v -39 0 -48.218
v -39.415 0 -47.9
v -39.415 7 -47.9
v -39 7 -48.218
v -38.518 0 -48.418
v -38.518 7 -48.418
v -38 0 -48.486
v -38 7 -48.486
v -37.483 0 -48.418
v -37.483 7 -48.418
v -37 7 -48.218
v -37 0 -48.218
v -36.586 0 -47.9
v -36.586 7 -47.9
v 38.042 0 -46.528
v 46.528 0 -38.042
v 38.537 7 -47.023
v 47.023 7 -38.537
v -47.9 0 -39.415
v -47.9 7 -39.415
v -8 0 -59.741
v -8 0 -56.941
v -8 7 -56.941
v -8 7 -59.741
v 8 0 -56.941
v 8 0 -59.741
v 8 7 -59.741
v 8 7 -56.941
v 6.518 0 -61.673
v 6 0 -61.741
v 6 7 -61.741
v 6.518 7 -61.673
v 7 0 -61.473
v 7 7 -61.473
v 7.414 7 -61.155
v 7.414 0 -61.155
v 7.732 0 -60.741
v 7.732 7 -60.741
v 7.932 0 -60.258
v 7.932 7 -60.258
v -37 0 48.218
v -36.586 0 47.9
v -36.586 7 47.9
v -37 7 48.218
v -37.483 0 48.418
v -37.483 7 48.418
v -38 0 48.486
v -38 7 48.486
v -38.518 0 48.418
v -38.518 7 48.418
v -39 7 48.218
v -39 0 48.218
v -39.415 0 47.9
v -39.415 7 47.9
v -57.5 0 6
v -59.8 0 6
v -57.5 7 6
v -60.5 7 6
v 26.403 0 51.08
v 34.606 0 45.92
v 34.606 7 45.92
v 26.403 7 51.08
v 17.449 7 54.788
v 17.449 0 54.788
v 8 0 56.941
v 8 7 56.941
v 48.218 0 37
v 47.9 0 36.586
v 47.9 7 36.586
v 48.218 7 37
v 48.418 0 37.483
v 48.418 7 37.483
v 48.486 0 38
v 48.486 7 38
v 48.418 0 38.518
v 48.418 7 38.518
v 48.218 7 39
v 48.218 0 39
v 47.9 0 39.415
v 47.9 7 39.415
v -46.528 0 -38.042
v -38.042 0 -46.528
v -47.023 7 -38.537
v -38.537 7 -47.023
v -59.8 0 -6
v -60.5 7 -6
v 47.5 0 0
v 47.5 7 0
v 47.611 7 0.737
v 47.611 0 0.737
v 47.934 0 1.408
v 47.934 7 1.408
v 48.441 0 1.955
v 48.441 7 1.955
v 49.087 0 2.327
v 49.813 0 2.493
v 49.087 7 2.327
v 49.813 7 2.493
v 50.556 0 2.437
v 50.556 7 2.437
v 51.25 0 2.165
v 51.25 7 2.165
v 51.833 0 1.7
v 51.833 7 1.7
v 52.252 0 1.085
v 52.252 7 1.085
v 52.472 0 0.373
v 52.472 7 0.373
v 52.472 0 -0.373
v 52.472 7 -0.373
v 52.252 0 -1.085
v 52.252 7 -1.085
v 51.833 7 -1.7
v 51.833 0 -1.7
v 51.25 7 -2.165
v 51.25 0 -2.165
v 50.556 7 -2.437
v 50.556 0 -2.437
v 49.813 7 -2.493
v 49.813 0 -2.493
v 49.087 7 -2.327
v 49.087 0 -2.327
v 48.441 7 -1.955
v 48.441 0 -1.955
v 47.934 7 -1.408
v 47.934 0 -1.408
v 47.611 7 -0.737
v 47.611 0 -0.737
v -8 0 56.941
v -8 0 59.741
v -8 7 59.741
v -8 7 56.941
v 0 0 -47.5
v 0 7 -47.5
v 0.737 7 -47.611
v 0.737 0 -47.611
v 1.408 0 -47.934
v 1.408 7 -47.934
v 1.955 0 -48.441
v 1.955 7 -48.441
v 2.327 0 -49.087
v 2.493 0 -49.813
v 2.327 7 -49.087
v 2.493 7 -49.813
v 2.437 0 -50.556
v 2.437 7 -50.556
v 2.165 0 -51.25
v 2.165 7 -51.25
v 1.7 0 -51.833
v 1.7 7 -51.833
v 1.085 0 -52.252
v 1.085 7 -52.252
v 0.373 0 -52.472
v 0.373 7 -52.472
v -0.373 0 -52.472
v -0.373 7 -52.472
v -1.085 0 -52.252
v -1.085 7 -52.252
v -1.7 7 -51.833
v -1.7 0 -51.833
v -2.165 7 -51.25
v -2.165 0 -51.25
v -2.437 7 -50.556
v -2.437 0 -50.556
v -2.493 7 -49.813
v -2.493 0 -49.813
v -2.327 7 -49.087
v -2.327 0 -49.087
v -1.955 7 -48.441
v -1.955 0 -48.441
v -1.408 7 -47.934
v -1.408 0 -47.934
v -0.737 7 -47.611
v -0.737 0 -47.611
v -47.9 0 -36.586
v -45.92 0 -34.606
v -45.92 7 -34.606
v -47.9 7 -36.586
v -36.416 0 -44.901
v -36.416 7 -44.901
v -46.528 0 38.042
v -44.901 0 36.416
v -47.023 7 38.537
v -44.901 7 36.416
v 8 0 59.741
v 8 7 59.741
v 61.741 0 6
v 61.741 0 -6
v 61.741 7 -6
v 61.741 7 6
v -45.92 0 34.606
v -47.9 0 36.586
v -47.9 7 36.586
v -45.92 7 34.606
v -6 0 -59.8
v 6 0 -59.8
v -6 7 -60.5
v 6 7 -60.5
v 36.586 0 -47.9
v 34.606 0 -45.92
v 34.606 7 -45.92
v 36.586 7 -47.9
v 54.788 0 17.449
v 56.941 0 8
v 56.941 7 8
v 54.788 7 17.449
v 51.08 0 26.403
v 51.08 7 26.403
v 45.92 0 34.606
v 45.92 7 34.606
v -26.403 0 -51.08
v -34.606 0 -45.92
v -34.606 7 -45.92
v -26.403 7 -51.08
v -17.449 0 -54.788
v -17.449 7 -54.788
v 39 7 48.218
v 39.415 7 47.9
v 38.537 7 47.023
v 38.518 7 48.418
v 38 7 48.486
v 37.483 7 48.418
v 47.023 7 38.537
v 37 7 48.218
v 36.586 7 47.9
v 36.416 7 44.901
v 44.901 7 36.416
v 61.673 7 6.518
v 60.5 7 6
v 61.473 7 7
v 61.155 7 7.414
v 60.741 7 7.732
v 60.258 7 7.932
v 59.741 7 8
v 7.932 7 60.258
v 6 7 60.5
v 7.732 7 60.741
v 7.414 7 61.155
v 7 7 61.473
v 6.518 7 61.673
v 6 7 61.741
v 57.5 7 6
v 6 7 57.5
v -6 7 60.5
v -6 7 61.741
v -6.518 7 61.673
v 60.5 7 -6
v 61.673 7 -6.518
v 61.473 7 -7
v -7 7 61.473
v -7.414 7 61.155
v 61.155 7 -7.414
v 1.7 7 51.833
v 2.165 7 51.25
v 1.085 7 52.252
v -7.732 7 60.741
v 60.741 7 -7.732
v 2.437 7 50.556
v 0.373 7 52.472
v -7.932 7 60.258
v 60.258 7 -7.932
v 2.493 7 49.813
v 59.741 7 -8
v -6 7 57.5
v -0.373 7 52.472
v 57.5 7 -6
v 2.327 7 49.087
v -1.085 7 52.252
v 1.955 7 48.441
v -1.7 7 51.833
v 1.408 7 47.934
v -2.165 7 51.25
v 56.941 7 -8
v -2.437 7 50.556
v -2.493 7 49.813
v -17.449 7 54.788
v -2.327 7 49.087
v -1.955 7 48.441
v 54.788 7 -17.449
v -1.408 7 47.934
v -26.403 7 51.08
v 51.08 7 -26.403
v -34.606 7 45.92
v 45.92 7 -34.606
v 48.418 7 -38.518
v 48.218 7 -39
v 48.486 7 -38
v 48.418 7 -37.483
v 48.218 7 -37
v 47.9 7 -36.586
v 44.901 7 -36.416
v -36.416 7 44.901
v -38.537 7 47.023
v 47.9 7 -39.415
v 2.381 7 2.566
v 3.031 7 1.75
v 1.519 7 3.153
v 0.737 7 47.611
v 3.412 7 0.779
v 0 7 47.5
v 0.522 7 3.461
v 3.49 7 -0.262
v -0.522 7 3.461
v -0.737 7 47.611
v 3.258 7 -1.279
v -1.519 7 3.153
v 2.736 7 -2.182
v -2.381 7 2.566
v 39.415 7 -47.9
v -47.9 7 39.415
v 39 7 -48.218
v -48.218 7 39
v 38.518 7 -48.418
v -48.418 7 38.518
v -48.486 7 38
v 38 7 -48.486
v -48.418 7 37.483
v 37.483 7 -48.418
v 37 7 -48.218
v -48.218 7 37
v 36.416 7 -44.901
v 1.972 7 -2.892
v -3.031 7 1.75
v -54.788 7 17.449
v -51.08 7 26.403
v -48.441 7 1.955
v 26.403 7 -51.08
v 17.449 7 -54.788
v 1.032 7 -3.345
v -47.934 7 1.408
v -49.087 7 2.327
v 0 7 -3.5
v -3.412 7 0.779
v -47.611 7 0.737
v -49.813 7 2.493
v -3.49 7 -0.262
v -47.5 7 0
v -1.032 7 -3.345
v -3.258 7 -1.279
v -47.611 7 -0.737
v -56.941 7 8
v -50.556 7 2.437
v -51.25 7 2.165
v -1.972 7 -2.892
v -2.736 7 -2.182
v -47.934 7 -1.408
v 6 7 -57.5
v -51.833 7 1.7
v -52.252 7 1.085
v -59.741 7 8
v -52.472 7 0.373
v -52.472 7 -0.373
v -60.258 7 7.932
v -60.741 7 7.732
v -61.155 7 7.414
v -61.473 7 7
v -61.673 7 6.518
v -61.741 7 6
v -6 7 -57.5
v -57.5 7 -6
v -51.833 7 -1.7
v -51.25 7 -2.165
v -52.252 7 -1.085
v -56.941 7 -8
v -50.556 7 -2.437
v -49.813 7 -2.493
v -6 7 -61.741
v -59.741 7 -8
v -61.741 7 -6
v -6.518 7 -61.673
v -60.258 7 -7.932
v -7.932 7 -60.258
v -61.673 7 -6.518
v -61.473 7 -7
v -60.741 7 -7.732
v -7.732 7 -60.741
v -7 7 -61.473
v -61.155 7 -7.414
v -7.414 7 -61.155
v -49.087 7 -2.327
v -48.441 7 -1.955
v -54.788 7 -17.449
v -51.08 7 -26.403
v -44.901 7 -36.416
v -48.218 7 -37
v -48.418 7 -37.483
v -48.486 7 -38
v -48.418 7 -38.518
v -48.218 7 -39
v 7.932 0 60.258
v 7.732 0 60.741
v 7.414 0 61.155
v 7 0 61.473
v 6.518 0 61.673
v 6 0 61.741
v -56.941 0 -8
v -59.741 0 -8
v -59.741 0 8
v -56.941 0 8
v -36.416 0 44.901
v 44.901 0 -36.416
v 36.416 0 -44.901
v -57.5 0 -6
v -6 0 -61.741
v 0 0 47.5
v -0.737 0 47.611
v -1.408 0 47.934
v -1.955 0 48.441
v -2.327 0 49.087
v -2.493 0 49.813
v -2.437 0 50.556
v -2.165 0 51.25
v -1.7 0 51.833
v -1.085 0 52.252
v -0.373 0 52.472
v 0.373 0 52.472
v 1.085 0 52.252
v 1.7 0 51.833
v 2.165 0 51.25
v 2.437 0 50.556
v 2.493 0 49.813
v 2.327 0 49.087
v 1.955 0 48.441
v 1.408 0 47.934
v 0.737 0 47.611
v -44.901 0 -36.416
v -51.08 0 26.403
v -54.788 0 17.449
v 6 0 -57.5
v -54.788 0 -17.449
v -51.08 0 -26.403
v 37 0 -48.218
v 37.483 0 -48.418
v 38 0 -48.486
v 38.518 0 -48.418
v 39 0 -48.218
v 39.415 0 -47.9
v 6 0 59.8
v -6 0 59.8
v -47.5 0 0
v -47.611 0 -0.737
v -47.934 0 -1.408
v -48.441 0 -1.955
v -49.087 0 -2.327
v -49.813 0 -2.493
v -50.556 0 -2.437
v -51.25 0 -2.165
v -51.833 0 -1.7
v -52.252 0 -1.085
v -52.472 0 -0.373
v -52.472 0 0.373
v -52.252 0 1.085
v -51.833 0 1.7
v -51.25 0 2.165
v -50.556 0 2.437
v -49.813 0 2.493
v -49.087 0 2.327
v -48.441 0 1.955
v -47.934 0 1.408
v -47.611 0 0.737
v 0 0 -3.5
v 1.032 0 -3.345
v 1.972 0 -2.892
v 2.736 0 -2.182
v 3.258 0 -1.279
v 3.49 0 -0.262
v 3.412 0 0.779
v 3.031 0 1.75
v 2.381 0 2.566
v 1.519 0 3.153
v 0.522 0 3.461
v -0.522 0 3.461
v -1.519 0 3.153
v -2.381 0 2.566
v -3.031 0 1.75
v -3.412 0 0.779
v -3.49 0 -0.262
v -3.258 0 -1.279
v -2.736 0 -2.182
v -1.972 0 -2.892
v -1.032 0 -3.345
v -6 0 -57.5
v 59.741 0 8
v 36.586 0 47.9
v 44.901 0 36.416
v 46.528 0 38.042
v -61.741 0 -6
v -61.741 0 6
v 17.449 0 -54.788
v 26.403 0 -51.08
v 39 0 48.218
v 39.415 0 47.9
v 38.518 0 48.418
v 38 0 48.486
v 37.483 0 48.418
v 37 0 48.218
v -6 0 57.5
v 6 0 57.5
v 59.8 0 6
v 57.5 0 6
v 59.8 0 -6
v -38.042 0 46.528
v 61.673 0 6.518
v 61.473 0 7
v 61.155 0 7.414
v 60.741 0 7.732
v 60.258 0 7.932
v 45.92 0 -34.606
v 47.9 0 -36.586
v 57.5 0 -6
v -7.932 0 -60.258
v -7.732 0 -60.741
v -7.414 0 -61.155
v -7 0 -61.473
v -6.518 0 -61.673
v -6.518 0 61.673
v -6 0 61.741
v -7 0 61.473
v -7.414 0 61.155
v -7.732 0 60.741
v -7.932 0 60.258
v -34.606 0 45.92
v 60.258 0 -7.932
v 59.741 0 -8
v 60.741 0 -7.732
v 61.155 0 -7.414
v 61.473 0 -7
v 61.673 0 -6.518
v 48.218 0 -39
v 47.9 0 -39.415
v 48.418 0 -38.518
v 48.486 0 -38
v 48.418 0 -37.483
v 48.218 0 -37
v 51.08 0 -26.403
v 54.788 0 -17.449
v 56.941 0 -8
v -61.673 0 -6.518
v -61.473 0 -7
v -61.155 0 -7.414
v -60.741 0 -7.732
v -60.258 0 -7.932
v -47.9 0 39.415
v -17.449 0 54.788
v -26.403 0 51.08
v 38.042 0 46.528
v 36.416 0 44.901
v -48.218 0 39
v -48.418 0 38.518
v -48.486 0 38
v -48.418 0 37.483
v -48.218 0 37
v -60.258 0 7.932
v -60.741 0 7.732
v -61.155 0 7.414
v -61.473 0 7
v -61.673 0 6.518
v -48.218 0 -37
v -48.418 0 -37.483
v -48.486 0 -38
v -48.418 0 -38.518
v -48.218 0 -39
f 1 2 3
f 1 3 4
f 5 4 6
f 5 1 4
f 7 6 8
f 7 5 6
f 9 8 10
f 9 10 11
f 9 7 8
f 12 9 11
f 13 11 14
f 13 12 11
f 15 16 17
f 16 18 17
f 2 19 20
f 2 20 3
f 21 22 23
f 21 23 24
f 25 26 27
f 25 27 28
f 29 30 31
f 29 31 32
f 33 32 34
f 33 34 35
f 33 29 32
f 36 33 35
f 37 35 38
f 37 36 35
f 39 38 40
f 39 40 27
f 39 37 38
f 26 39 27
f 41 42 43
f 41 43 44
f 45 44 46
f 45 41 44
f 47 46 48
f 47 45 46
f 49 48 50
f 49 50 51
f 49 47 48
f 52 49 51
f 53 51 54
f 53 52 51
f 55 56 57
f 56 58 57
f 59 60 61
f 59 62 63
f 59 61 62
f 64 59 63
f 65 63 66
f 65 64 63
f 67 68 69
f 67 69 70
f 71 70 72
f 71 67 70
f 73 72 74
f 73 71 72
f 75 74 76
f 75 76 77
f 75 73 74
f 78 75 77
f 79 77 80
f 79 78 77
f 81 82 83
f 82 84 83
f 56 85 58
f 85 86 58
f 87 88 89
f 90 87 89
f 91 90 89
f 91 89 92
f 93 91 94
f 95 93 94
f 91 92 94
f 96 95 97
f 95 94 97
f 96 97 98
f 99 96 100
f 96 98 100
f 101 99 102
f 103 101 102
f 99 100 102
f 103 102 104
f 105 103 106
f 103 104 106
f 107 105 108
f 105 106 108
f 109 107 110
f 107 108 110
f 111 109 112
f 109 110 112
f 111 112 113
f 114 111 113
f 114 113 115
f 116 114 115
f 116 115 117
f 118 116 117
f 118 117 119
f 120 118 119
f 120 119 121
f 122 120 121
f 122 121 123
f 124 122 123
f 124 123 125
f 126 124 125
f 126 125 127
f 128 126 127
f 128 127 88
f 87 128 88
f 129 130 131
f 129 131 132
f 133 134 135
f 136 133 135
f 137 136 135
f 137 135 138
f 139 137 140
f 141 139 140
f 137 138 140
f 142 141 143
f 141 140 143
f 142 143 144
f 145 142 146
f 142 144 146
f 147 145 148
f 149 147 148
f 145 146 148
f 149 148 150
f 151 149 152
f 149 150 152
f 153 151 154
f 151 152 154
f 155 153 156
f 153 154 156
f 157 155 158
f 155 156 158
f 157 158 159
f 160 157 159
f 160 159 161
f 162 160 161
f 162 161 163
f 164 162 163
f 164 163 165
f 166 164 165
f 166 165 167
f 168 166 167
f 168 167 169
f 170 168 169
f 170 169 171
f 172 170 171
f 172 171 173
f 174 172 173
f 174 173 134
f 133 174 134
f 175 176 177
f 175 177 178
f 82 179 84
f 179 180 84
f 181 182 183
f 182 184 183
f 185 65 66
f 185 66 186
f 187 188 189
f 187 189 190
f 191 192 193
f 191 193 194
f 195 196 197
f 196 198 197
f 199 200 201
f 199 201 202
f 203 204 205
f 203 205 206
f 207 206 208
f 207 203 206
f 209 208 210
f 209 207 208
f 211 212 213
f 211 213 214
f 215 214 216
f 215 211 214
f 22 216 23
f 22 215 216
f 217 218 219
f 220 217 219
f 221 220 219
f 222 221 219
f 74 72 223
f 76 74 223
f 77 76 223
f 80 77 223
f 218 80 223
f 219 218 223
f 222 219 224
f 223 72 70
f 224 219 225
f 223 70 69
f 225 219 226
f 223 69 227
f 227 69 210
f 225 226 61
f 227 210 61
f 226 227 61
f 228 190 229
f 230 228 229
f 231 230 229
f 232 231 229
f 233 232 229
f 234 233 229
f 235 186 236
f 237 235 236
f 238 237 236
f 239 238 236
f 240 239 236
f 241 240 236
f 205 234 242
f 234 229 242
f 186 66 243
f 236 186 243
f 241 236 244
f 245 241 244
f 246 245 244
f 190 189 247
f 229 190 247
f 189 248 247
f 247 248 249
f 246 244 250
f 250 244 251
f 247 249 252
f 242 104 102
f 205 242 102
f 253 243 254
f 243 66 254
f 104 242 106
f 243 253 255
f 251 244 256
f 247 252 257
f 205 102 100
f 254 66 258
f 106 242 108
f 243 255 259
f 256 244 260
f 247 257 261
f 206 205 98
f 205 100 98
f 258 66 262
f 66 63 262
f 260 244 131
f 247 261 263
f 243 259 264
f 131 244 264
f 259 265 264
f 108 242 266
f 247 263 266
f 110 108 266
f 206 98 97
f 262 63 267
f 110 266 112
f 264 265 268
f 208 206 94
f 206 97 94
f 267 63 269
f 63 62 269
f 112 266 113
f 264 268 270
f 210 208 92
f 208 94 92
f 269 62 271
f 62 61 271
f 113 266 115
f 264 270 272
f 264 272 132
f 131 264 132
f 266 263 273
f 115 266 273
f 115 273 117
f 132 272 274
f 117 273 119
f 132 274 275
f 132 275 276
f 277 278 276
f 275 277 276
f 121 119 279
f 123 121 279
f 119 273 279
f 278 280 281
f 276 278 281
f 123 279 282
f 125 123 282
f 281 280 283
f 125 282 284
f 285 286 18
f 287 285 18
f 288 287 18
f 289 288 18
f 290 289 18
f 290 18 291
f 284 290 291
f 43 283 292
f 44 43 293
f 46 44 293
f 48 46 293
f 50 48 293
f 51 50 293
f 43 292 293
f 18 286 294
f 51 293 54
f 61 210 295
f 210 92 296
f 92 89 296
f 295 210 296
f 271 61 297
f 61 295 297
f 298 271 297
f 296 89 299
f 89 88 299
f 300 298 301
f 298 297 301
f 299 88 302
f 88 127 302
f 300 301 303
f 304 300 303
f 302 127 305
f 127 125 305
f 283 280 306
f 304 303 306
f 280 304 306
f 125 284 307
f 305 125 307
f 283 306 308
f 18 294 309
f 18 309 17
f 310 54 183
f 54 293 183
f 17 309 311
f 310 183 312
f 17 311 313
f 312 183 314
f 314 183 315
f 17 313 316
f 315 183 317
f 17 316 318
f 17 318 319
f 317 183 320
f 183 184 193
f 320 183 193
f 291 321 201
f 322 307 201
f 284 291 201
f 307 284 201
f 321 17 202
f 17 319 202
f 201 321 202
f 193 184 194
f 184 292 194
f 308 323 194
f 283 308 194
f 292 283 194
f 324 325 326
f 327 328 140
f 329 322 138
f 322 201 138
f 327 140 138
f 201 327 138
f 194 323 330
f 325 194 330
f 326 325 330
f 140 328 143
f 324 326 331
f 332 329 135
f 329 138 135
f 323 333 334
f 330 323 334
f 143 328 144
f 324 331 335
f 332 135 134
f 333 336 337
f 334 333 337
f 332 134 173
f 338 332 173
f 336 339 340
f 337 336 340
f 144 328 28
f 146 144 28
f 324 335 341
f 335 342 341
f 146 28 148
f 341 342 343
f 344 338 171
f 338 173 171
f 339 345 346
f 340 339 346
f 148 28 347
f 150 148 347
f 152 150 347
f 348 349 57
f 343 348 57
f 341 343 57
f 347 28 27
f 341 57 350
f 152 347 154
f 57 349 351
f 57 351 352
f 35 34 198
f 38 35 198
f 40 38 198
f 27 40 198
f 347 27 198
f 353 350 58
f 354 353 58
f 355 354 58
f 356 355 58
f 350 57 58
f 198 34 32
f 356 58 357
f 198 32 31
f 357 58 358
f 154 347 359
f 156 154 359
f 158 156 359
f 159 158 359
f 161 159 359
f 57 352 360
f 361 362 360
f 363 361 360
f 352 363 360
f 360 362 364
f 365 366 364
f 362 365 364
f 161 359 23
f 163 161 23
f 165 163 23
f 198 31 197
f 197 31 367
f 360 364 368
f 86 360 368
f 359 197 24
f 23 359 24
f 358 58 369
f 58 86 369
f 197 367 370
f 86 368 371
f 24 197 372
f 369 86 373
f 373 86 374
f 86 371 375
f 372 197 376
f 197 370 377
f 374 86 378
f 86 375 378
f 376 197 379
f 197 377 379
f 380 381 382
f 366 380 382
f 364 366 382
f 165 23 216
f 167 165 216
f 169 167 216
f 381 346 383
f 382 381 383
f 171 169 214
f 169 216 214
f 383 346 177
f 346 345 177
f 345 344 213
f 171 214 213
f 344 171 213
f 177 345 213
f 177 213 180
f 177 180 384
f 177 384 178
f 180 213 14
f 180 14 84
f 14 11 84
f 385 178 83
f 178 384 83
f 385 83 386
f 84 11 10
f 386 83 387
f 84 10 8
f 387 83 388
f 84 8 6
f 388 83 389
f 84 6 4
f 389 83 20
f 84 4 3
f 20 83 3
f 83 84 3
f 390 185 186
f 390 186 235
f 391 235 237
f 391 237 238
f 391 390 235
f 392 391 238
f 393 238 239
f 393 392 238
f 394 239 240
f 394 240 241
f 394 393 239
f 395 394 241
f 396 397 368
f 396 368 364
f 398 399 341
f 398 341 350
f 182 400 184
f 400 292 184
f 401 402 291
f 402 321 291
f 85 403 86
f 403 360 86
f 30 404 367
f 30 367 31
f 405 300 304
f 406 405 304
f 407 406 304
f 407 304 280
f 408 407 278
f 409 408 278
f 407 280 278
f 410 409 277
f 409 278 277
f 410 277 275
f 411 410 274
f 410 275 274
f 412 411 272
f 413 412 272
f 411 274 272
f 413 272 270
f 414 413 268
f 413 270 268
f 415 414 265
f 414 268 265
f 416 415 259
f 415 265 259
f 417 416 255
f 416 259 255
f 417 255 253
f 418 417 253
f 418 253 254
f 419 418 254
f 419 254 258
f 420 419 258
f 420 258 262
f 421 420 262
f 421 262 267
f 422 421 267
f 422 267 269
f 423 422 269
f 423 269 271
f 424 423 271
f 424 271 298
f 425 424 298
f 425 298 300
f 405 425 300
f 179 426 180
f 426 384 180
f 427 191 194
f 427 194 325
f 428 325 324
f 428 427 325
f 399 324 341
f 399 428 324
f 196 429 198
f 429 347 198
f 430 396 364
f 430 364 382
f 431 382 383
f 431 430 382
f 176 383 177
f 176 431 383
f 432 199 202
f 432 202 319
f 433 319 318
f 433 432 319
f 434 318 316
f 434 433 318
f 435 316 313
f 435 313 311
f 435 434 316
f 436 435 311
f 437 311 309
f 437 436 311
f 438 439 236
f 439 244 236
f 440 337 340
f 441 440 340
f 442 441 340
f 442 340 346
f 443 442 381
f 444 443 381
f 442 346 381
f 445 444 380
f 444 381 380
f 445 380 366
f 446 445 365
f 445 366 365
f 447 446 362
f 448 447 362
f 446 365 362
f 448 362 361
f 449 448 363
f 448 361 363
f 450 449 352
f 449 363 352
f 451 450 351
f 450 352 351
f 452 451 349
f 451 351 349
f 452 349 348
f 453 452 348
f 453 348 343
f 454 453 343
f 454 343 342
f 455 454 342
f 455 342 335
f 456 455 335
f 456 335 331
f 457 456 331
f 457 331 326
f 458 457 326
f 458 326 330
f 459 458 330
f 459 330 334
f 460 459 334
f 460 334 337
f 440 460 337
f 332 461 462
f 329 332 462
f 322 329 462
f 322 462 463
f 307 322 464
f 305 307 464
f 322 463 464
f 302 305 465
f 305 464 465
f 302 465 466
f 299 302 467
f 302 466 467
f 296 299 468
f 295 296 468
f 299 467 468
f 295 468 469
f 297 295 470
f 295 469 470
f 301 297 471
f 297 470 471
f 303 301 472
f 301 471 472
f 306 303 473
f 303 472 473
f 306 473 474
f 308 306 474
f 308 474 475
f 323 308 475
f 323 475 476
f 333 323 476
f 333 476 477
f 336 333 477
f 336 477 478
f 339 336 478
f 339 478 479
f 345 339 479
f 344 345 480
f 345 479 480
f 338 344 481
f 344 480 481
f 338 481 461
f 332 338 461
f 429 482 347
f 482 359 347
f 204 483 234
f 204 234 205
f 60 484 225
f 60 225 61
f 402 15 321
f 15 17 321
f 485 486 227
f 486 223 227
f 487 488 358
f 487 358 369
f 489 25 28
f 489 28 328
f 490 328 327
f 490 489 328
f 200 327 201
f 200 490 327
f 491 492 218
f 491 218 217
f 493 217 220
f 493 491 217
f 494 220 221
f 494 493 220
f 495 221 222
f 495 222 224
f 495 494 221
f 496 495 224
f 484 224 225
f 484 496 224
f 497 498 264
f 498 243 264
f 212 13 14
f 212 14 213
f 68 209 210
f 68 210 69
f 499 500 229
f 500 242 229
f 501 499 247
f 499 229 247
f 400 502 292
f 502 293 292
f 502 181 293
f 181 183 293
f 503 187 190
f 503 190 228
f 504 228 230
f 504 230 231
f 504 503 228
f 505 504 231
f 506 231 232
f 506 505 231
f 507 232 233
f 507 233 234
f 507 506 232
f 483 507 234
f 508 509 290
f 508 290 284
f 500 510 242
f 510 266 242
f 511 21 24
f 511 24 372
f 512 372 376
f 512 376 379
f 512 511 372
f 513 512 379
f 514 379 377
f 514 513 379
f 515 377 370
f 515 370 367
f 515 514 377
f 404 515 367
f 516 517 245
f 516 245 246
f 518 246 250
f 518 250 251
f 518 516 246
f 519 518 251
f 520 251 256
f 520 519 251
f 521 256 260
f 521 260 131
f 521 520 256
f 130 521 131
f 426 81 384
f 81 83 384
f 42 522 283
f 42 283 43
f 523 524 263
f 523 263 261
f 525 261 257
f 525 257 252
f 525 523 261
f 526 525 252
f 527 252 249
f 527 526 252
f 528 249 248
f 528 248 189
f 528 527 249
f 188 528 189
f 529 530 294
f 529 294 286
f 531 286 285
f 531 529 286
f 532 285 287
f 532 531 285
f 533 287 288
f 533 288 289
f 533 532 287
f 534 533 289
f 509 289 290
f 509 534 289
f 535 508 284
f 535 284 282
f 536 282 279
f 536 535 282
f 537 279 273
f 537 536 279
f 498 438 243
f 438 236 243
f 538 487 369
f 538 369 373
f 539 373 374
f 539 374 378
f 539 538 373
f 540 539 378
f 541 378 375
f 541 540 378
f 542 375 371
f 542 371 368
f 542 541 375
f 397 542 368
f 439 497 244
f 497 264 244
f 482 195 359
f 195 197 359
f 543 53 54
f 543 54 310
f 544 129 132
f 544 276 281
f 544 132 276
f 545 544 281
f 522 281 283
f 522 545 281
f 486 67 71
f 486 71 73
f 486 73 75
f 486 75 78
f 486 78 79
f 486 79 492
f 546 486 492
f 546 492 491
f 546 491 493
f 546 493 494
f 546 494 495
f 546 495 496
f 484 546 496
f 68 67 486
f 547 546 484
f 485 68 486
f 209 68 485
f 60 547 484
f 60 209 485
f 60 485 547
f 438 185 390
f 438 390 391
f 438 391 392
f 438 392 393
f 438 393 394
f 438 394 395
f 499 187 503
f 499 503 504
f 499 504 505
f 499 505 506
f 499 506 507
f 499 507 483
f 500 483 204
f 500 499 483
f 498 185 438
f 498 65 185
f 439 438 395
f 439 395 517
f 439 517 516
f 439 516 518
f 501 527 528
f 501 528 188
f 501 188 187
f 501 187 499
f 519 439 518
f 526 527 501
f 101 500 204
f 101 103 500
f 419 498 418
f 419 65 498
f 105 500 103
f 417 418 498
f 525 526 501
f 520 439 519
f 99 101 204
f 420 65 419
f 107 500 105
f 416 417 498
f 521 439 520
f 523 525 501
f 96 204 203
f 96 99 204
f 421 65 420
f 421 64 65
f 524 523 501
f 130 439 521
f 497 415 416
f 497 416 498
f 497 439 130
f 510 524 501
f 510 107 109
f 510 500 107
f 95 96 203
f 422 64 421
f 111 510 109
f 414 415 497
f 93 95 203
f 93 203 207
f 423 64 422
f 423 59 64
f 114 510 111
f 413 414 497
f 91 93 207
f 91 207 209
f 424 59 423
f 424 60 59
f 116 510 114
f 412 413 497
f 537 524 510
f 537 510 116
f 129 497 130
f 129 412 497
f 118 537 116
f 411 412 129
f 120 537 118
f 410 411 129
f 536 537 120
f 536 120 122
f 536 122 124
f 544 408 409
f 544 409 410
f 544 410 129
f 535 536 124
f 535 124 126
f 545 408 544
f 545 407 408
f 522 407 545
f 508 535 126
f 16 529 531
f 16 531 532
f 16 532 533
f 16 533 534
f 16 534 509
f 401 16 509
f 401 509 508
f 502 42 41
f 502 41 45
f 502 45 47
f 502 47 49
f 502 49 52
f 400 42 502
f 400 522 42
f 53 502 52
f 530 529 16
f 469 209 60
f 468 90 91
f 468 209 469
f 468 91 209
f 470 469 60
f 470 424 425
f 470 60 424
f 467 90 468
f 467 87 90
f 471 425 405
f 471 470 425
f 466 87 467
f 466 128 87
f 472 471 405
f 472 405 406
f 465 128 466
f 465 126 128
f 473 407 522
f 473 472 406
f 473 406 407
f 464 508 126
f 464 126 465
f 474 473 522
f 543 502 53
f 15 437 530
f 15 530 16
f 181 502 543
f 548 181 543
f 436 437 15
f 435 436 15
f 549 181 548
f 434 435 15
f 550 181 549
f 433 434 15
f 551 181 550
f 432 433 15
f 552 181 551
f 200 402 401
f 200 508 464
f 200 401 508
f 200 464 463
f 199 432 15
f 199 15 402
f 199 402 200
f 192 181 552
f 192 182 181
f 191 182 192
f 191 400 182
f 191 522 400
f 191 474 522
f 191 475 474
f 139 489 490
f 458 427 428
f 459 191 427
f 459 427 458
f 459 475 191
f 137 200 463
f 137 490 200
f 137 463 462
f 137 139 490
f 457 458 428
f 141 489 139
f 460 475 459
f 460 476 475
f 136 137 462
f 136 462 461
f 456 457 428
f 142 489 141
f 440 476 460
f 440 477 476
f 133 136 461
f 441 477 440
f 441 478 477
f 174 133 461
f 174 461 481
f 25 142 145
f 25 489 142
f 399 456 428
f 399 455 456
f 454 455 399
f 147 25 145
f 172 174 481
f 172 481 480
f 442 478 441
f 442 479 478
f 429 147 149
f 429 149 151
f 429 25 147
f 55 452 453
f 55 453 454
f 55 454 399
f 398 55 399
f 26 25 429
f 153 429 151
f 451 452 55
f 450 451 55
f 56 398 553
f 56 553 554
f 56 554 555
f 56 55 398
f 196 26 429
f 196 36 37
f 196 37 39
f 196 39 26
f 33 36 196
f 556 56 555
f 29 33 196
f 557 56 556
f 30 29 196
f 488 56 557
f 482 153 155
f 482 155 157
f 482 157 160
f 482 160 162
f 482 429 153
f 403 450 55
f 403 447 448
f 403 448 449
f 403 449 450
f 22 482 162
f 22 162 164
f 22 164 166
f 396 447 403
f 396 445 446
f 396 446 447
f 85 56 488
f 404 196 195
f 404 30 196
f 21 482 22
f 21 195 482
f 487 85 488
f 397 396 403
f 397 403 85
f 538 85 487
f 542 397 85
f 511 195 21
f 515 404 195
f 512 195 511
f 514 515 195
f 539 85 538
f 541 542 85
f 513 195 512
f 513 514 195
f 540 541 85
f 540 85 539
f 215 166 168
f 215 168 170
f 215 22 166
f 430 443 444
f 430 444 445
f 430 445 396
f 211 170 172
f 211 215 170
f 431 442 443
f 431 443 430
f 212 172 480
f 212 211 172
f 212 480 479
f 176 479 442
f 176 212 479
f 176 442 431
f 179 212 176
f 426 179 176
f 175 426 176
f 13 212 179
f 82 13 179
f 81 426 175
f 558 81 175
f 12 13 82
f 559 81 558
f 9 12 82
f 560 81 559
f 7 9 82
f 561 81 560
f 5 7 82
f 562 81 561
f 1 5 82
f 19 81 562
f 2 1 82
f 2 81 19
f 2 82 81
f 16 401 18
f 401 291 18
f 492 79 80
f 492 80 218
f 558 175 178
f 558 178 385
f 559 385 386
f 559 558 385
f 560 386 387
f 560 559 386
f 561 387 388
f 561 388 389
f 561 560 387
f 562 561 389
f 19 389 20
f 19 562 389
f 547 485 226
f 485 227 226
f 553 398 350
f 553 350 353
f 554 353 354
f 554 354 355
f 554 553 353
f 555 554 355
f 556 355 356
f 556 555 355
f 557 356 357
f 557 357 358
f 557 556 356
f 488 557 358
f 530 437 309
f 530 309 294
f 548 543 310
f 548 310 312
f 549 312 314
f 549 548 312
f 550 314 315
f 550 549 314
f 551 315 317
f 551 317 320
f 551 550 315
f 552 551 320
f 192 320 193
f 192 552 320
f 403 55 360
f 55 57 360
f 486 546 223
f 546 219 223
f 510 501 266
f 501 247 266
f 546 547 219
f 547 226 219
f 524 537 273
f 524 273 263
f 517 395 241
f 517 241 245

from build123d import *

# Parameters (mm, degrees)
BOSS_EXTRUDE1_DEPTH    = 7
SKETCH2_W              = 5
SKETCH2_H              = 10
BOSS_EXTRUDE2_DEPTH    = 95
SKETCH15_R             = 3.5
CUT_EXTRUDE3_DEPTH     = 7
CIRPATTERN1_COUNT      = 8
SKETCH18_W             = 10
SKETCH18_H             = 5
BOSS_EXTRUDE3_DEPTH    = 34
BOSS_EXTRUDE4_DEPTH    = 10
FILLET1_R              = 2
FILLET2_R              = 2
LPATTERN2_COUNT        = 10
LPATTERN2_PITCH        = 8
FILLET1_OF_LPATTERN2_R = 2
SKETCH20_R             = 2.5
CUT_EXTRUDE4_DEPTH     = 10
CIRPATTERN2_COUNT      = 4
CUT_EXTRUDE7_DEPTH     = 142.792331695


with BuildPart() as part:
    # Sketch1 → Boss-Extrude1 (new body)
    with BuildSketch(Plane(origin=(0, 0, 0), x_dir=(1, 0, 0), z_dir=(0, 1, 0))):
        with BuildLine():
            Line((-8, 56.940758688), (-8, 59.740758688))
            ThreePointArc((-8, 59.740758688), (-7.414213562, 61.154972251), (-6, 61.740758688))
            Line((-6, 61.740758688), (6, 61.740758688))
            ThreePointArc((6, 61.740758688), (7.414213562, 61.154972251), (8, 59.740758688))
            Line((8, 59.740758688), (8, 56.940758688))
            ThreePointArc((8, 56.940758688), (22.004297361, 53.123073119), (34.606342345, 45.920050844))
            Line((34.606342345, 45.920050844), (36.586241332, 47.899949831))
            ThreePointArc((36.586241332, 47.899949831), (38.000454895, 48.485736269), (39.414668457, 47.899949831))
            Line((39.414668457, 47.899949831), (47.899949831, 39.414668457))
            ThreePointArc((47.899949831, 39.414668457), (48.485736269, 38.000454895), (47.899949831, 36.586241332))
            Line((47.899949831, 36.586241332), (45.920050844, 34.606342345))
            ThreePointArc((45.920050844, 34.606342345), (53.123073119, 22.004297361), (56.940758688, 8))
            Line((56.940758688, 8), (59.740758688, 8))
            ThreePointArc((59.740758688, 8), (61.154972251, 7.414213562), (61.740758688, 6))
            Line((61.740758688, 6), (61.740758688, -6))
            ThreePointArc((61.740758688, -6), (61.154972251, -7.414213562), (59.740758688, -8))
            Line((59.740758688, -8), (56.940758688, -8))
            ThreePointArc((56.940758688, -8), (53.123073119, -22.004297361), (45.920050844, -34.606342345))
            Line((45.920050844, -34.606342345), (47.899949831, -36.586241332))
            ThreePointArc((47.899949831, -36.586241332), (48.485736269, -38.000454895), (47.899949831, -39.414668457))
            Line((47.899949831, -39.414668457), (39.414668457, -47.899949831))
            ThreePointArc((39.414668457, -47.899949831), (38.000454895, -48.485736269), (36.586241332, -47.899949831))
            Line((36.586241332, -47.899949831), (34.606342345, -45.920050844))
            ThreePointArc((34.606342345, -45.920050844), (22.004297361, -53.123073119), (8, -56.940758688))
            Line((8, -56.940758688), (8, -59.740758688))
            ThreePointArc((8, -59.740758688), (7.414213562, -61.154972251), (6, -61.740758688))
            Line((6, -61.740758688), (-6, -61.740758688))
            ThreePointArc((-6, -61.740758688), (-7.414213562, -61.154972251), (-8, -59.740758688))
            Line((-8, -59.740758688), (-8, -56.940758688))
            ThreePointArc((-8, -56.940758688), (-22.004297361, -53.123073119), (-34.606342345, -45.920050844))
            Line((-34.606342345, -45.920050844), (-36.586241332, -47.899949831))
            ThreePointArc((-36.586241332, -47.899949831), (-38.000454895, -48.485736269), (-39.414668457, -47.899949831))
            Line((-39.414668457, -47.899949831), (-47.899949831, -39.414668457))
            ThreePointArc((-47.899949831, -39.414668457), (-48.485736269, -38.000454895), (-47.899949831, -36.586241332))
            Line((-47.899949831, -36.586241332), (-45.920050844, -34.606342345))
            ThreePointArc((-45.920050844, -34.606342345), (-53.123073119, -22.004297361), (-56.940758688, -8))
            Line((-56.940758688, -8), (-59.740758688, -8))
            ThreePointArc((-59.740758688, -8), (-61.154972251, -7.414213562), (-61.740758688, -6))
            Line((-61.740758688, -6), (-61.740758688, 6))
            ThreePointArc((-61.740758688, 6), (-61.154972251, 7.414213562), (-59.740758688, 8))
            Line((-59.740758688, 8), (-56.940758688, 8))
            ThreePointArc((-56.940758688, 8), (-53.123073119, 22.004297361), (-45.920050844, 34.606342345))
            Line((-45.920050844, 34.606342345), (-47.899949831, 36.586241332))
            ThreePointArc((-47.899949831, 36.586241332), (-48.485736269, 38.000454895), (-47.899949831, 39.414668457))
            Line((-47.899949831, 39.414668457), (-39.414668457, 47.899949831))
            ThreePointArc((-39.414668457, 47.899949831), (-38.000454895, 48.485736269), (-36.586241332, 47.899949831))
            Line((-36.586241332, 47.899949831), (-34.606342345, 45.920050844))
            ThreePointArc((-34.606342345, 45.920050844), (-22.004297361, 53.123073119), (-8, 56.940758688))
        make_face()
    extrude(amount=BOSS_EXTRUDE1_DEPTH)

    # Sketch2 → Boss-Extrude2 (add)
    with BuildSketch(Plane(origin=(0, 7, 0), x_dir=(1, 0, 0), z_dir=(0, 1, 0))):
        with Locations((19.5, 10)):
            Rectangle(SKETCH2_W, SKETCH2_H)
        with Locations((-19.5, 10)):
            Rectangle(SKETCH2_W, SKETCH2_H)
    extrude(amount=BOSS_EXTRUDE2_DEPTH)

    # Sketch15 → Cut-Extrude3 (cut)
    with BuildSketch(Plane.XZ):
        with Locations(Location((0, 0, 0), (0, 0, 270))):
            Circle(SKETCH15_R)
    extrude(amount=-CUT_EXTRUDE3_DEPTH, mode=Mode.SUBTRACT)

    # Sketch16 → Cut-Loft2 section 0
    with BuildSketch(Plane.XZ):
        with BuildLine():
            Line((-6, 59.8), (6, 59.8))
            Line((6, 59.8), (6, 57.5))
            Line((6, 57.5), (-6, 57.5))
            Line((-6, 57.5), (-6, 59.8))
        make_face()
    # Sketch17 → Cut-Loft2 section 1
    with BuildSketch(Plane(origin=(0, 7, 0), x_dir=(1, 0, 0), z_dir=(0, 1, 0))):
        with BuildLine():
            Line((-6, -57.5), (6, -57.5))
            Line((6, -57.5), (6, -60.5))
            Line((6, -60.5), (-6, -60.5))
            Line((-6, -60.5), (-6, -57.5))
        make_face()
    cut_loft2 = loft(mode=Mode.SUBTRACT)

    # CirPattern1: Cut-Loft2 ×8 about axis
    cirpattern1_axis = Axis((0, 0, 0), (0, 1, 0))
    for i in range(1, CIRPATTERN1_COUNT):
        add(cut_loft2.rotate(cirpattern1_axis, i * 360 / CIRPATTERN1_COUNT), mode=Mode.SUBTRACT)

    # Sketch18 → Boss-Extrude3 (add)
    with BuildSketch(Plane(origin=(-17, 0, 0), x_dir=(0, 0, -1), z_dir=(1, 0, 0))):
        with Locations((10, 99.5)):
            Rectangle(SKETCH18_W, SKETCH18_H)
    extrude(amount=BOSS_EXTRUDE3_DEPTH)

    # Sketch19 → Boss-Extrude4 (add)
    with BuildSketch(Plane(origin=(0, 0, -15), x_dir=(-1, 0, 0), z_dir=(0, 0, -1))):
        with BuildLine():
            Line((-17, 93), (-11.04472309, 92.26878394))
            ThreePointArc((-11.04472309, 92.26878394), (-9.922197884, 91), (-11.04472309, 89.73121606))
            Line((-11.04472309, 89.73121606), (-17, 89))
            Line((-17, 89), (-17, 93))
        make_face()
    boss_extrude4 = extrude(amount=-BOSS_EXTRUDE4_DEPTH)

    # Fillet1
    fillet1_edges = [part.edges().sort_by_distance(p)[0] for p in [
        (17, 89, -10),
        (17, 93, -10),
    ]]
    fillet(fillet1_edges, radius=FILLET1_R)

    # Fillet2
    fillet2_edges = [part.edges().sort_by_distance(p)[0] for p in [
        (22, 102, -10),
        (-22, 102, -10),
        (-17, 97, -10),
        (17, 97, -10),
    ]]
    fillet(fillet2_edges, radius=FILLET2_R)

    # LPattern2: Boss-Extrude4 ×10
    with Locations(*[(0, -i * LPATTERN2_PITCH, 0) for i in range(1, LPATTERN2_COUNT)]):
        add(boss_extrude4)

    # Fillet1 of LPattern2
    fillet1_of_lpattern2_edges = [part.edges().sort_by_distance(p)[0] for p in [
        (17, 81, -10),
        (17, 85, -10),
        (17, 73, -10),
        (17, 77, -10),
        (17, 65, -10),
        (17, 69, -10),
        (17, 57, -10),
        (17, 61, -10),
        (17, 49, -10),
        (17, 53, -10),
        (17, 41, -10),
        (17, 45, -10),
        (17, 33, -10),
        (17, 37, -10),
        (17, 25, -10),
        (17, 29, -10),
        (17, 17, -10),
        (17, 21, -10),
    ]]
    fillet(fillet1_of_lpattern2_edges, radius=FILLET1_OF_LPATTERN2_R)

    # Sketch20 → Cut-Extrude4 (cut)
    with BuildSketch(Plane(origin=(0, 7, 0), x_dir=(1, 0, 0), z_dir=(0, 1, 0))):
        with Locations(Location((0, 50, 0), (0, 0, 270))):
            Circle(SKETCH20_R)
    cut_extrude4 = extrude(amount=-CUT_EXTRUDE4_DEPTH, mode=Mode.SUBTRACT)

    # CirPattern2: Cut-Extrude4 ×4 about axis
    cirpattern2_axis = Axis((0, 0, 0), (0, 1, 0))
    for i in range(1, CIRPATTERN2_COUNT):
        add(cut_extrude4.rotate(cirpattern2_axis, i * 360 / CIRPATTERN2_COUNT), mode=Mode.SUBTRACT)

    # Sketch22 → Cut-Extrude7 (cut, through all)
    with BuildSketch(Plane(origin=(0, 0, -15), x_dir=(-1, 0, 0), z_dir=(0, 0, -1))):
        with BuildLine():
            Line((20, 102), (-20, 102))
            ThreePointArc((-20, 102), (-21.414213562, 101.414213562), (-22, 100))
            Line((-22, 100), (-22, 7))
            Line((-22, 7), (-17, 7))
            Line((-17, 7), (-17, 15.230549471))
            ThreePointArc((-17, 15.230549471), (-16.497911442, 16.555789567), (-15.243738687, 17.215641774))
            Line((-15.243738687, 17.215641774), (-11.04472309, 17.73121606))
            ThreePointArc((-11.04472309, 17.73121606), (-9.922197884, 19), (-11.04472309, 20.26878394))
            Line((-11.04472309, 20.26878394), (-15.243738687, 20.784358226))
            ThreePointArc((-15.243738687, 20.784358226), (-16.497911442, 21.444210433), (-17, 22.769450529))
            Line((-17, 22.769450529), (-17, 23.230549471))
            ThreePointArc((-17, 23.230549471), (-16.497911442, 24.555789567), (-15.243738687, 25.215641774))
            Line((-15.243738687, 25.215641774), (-11.04472309, 25.73121606))
            ThreePointArc((-11.04472309, 25.73121606), (-9.922197884, 27), (-11.04472309, 28.26878394))
            Line((-11.04472309, 28.26878394), (-15.243738687, 28.784358226))
            ThreePointArc((-15.243738687, 28.784358226), (-16.497911442, 29.444210433), (-17, 30.769450529))
            Line((-17, 30.769450529), (-17, 31.230549471))
            ThreePointArc((-17, 31.230549471), (-16.497911442, 32.555789567), (-15.243738687, 33.215641774))
            Line((-15.243738687, 33.215641774), (-11.04472309, 33.73121606))
            ThreePointArc((-11.04472309, 33.73121606), (-9.922197884, 35), (-11.04472309, 36.26878394))
            Line((-11.04472309, 36.26878394), (-15.243738687, 36.784358226))
            ThreePointArc((-15.243738687, 36.784358226), (-16.497911442, 37.444210433), (-17, 38.769450529))
            Line((-17, 38.769450529), (-17, 39.230549471))
            ThreePointArc((-17, 39.230549471), (-16.497911442, 40.555789567), (-15.243738687, 41.215641774))
            Line((-15.243738687, 41.215641774), (-11.04472309, 41.73121606))
            ThreePointArc((-11.04472309, 41.73121606), (-9.922197884, 43), (-11.04472309, 44.26878394))
            Line((-11.04472309, 44.26878394), (-15.243738687, 44.784358226))
            ThreePointArc((-15.243738687, 44.784358226), (-16.497911442, 45.444210433), (-17, 46.769450529))
            Line((-17, 46.769450529), (-17, 47.230549471))
            ThreePointArc((-17, 47.230549471), (-16.497911442, 48.555789567), (-15.243738687, 49.215641774))
            Line((-15.243738687, 49.215641774), (-11.04472309, 49.73121606))
            ThreePointArc((-11.04472309, 49.73121606), (-9.922197884, 51), (-11.04472309, 52.26878394))
            Line((-11.04472309, 52.26878394), (-15.243738687, 52.784358226))
            ThreePointArc((-15.243738687, 52.784358226), (-16.497911442, 53.444210433), (-17, 54.769450529))
            Line((-17, 54.769450529), (-17, 55.230549471))
            ThreePointArc((-17, 55.230549471), (-16.497911442, 56.555789567), (-15.243738687, 57.215641774))
            Line((-15.243738687, 57.215641774), (-11.04472309, 57.73121606))
            ThreePointArc((-11.04472309, 57.73121606), (-9.922197884, 59), (-11.04472309, 60.26878394))
            Line((-11.04472309, 60.26878394), (-15.243738687, 60.784358226))
            ThreePointArc((-15.243738687, 60.784358226), (-16.497911442, 61.444210433), (-17, 62.769450529))
            Line((-17, 62.769450529), (-17, 63.230549471))
            ThreePointArc((-17, 63.230549471), (-16.497911442, 64.555789567), (-15.243738687, 65.215641774))
            Line((-15.243738687, 65.215641774), (-11.04472309, 65.73121606))
            ThreePointArc((-11.04472309, 65.73121606), (-9.922197884, 67), (-11.04472309, 68.26878394))
            Line((-11.04472309, 68.26878394), (-15.243738687, 68.784358226))
            ThreePointArc((-15.243738687, 68.784358226), (-16.497911442, 69.444210433), (-17, 70.769450529))
            Line((-17, 70.769450529), (-17, 71.230549471))
            ThreePointArc((-17, 71.230549471), (-16.497911442, 72.555789567), (-15.243738687, 73.215641774))
            Line((-15.243738687, 73.215641774), (-11.04472309, 73.73121606))
            ThreePointArc((-11.04472309, 73.73121606), (-9.922197884, 75), (-11.04472309, 76.26878394))
            Line((-11.04472309, 76.26878394), (-15.243738687, 76.784358226))
            ThreePointArc((-15.243738687, 76.784358226), (-16.497911442, 77.444210433), (-17, 78.769450529))
            Line((-17, 78.769450529), (-17, 79.230549471))
            ThreePointArc((-17, 79.230549471), (-16.497911442, 80.555789567), (-15.243738687, 81.215641774))
            Line((-15.243738687, 81.215641774), (-11.04472309, 81.73121606))
            ThreePointArc((-11.04472309, 81.73121606), (-9.922197884, 83), (-11.04472309, 84.26878394))
            Line((-11.04472309, 84.26878394), (-15.243738687, 84.784358226))
            ThreePointArc((-15.243738687, 84.784358226), (-16.497911442, 85.444210433), (-17, 86.769450529))
            Line((-17, 86.769450529), (-17, 87.230549471))
            ThreePointArc((-17, 87.230549471), (-16.497911442, 88.555789567), (-15.243738687, 89.215641774))
            Line((-15.243738687, 89.215641774), (-11.04472309, 89.73121606))
            ThreePointArc((-11.04472309, 89.73121606), (-9.922197884, 91), (-11.04472309, 92.26878394))
            Line((-11.04472309, 92.26878394), (-15.243738687, 92.784358226))
            ThreePointArc((-15.243738687, 92.784358226), (-16.497911442, 93.444210433), (-17, 94.769450529))
            Line((-17, 94.769450529), (-17, 95))
            ThreePointArc((-17, 95), (-16.414213562, 96.414213562), (-15, 97))
            Line((-15, 97), (15, 97))
            ThreePointArc((15, 97), (16.414213562, 96.414213562), (17, 95))
            Line((17, 95), (17, 7))
            Line((17, 7), (22, 7))
            Line((22, 7), (22, 100))
            ThreePointArc((22, 100), (21.414213562, 101.414213562), (20, 102))
        make_face()
    extrude(amount=-CUT_EXTRUDE7_DEPTH, mode=Mode.SUBTRACT)


solid = part.part
